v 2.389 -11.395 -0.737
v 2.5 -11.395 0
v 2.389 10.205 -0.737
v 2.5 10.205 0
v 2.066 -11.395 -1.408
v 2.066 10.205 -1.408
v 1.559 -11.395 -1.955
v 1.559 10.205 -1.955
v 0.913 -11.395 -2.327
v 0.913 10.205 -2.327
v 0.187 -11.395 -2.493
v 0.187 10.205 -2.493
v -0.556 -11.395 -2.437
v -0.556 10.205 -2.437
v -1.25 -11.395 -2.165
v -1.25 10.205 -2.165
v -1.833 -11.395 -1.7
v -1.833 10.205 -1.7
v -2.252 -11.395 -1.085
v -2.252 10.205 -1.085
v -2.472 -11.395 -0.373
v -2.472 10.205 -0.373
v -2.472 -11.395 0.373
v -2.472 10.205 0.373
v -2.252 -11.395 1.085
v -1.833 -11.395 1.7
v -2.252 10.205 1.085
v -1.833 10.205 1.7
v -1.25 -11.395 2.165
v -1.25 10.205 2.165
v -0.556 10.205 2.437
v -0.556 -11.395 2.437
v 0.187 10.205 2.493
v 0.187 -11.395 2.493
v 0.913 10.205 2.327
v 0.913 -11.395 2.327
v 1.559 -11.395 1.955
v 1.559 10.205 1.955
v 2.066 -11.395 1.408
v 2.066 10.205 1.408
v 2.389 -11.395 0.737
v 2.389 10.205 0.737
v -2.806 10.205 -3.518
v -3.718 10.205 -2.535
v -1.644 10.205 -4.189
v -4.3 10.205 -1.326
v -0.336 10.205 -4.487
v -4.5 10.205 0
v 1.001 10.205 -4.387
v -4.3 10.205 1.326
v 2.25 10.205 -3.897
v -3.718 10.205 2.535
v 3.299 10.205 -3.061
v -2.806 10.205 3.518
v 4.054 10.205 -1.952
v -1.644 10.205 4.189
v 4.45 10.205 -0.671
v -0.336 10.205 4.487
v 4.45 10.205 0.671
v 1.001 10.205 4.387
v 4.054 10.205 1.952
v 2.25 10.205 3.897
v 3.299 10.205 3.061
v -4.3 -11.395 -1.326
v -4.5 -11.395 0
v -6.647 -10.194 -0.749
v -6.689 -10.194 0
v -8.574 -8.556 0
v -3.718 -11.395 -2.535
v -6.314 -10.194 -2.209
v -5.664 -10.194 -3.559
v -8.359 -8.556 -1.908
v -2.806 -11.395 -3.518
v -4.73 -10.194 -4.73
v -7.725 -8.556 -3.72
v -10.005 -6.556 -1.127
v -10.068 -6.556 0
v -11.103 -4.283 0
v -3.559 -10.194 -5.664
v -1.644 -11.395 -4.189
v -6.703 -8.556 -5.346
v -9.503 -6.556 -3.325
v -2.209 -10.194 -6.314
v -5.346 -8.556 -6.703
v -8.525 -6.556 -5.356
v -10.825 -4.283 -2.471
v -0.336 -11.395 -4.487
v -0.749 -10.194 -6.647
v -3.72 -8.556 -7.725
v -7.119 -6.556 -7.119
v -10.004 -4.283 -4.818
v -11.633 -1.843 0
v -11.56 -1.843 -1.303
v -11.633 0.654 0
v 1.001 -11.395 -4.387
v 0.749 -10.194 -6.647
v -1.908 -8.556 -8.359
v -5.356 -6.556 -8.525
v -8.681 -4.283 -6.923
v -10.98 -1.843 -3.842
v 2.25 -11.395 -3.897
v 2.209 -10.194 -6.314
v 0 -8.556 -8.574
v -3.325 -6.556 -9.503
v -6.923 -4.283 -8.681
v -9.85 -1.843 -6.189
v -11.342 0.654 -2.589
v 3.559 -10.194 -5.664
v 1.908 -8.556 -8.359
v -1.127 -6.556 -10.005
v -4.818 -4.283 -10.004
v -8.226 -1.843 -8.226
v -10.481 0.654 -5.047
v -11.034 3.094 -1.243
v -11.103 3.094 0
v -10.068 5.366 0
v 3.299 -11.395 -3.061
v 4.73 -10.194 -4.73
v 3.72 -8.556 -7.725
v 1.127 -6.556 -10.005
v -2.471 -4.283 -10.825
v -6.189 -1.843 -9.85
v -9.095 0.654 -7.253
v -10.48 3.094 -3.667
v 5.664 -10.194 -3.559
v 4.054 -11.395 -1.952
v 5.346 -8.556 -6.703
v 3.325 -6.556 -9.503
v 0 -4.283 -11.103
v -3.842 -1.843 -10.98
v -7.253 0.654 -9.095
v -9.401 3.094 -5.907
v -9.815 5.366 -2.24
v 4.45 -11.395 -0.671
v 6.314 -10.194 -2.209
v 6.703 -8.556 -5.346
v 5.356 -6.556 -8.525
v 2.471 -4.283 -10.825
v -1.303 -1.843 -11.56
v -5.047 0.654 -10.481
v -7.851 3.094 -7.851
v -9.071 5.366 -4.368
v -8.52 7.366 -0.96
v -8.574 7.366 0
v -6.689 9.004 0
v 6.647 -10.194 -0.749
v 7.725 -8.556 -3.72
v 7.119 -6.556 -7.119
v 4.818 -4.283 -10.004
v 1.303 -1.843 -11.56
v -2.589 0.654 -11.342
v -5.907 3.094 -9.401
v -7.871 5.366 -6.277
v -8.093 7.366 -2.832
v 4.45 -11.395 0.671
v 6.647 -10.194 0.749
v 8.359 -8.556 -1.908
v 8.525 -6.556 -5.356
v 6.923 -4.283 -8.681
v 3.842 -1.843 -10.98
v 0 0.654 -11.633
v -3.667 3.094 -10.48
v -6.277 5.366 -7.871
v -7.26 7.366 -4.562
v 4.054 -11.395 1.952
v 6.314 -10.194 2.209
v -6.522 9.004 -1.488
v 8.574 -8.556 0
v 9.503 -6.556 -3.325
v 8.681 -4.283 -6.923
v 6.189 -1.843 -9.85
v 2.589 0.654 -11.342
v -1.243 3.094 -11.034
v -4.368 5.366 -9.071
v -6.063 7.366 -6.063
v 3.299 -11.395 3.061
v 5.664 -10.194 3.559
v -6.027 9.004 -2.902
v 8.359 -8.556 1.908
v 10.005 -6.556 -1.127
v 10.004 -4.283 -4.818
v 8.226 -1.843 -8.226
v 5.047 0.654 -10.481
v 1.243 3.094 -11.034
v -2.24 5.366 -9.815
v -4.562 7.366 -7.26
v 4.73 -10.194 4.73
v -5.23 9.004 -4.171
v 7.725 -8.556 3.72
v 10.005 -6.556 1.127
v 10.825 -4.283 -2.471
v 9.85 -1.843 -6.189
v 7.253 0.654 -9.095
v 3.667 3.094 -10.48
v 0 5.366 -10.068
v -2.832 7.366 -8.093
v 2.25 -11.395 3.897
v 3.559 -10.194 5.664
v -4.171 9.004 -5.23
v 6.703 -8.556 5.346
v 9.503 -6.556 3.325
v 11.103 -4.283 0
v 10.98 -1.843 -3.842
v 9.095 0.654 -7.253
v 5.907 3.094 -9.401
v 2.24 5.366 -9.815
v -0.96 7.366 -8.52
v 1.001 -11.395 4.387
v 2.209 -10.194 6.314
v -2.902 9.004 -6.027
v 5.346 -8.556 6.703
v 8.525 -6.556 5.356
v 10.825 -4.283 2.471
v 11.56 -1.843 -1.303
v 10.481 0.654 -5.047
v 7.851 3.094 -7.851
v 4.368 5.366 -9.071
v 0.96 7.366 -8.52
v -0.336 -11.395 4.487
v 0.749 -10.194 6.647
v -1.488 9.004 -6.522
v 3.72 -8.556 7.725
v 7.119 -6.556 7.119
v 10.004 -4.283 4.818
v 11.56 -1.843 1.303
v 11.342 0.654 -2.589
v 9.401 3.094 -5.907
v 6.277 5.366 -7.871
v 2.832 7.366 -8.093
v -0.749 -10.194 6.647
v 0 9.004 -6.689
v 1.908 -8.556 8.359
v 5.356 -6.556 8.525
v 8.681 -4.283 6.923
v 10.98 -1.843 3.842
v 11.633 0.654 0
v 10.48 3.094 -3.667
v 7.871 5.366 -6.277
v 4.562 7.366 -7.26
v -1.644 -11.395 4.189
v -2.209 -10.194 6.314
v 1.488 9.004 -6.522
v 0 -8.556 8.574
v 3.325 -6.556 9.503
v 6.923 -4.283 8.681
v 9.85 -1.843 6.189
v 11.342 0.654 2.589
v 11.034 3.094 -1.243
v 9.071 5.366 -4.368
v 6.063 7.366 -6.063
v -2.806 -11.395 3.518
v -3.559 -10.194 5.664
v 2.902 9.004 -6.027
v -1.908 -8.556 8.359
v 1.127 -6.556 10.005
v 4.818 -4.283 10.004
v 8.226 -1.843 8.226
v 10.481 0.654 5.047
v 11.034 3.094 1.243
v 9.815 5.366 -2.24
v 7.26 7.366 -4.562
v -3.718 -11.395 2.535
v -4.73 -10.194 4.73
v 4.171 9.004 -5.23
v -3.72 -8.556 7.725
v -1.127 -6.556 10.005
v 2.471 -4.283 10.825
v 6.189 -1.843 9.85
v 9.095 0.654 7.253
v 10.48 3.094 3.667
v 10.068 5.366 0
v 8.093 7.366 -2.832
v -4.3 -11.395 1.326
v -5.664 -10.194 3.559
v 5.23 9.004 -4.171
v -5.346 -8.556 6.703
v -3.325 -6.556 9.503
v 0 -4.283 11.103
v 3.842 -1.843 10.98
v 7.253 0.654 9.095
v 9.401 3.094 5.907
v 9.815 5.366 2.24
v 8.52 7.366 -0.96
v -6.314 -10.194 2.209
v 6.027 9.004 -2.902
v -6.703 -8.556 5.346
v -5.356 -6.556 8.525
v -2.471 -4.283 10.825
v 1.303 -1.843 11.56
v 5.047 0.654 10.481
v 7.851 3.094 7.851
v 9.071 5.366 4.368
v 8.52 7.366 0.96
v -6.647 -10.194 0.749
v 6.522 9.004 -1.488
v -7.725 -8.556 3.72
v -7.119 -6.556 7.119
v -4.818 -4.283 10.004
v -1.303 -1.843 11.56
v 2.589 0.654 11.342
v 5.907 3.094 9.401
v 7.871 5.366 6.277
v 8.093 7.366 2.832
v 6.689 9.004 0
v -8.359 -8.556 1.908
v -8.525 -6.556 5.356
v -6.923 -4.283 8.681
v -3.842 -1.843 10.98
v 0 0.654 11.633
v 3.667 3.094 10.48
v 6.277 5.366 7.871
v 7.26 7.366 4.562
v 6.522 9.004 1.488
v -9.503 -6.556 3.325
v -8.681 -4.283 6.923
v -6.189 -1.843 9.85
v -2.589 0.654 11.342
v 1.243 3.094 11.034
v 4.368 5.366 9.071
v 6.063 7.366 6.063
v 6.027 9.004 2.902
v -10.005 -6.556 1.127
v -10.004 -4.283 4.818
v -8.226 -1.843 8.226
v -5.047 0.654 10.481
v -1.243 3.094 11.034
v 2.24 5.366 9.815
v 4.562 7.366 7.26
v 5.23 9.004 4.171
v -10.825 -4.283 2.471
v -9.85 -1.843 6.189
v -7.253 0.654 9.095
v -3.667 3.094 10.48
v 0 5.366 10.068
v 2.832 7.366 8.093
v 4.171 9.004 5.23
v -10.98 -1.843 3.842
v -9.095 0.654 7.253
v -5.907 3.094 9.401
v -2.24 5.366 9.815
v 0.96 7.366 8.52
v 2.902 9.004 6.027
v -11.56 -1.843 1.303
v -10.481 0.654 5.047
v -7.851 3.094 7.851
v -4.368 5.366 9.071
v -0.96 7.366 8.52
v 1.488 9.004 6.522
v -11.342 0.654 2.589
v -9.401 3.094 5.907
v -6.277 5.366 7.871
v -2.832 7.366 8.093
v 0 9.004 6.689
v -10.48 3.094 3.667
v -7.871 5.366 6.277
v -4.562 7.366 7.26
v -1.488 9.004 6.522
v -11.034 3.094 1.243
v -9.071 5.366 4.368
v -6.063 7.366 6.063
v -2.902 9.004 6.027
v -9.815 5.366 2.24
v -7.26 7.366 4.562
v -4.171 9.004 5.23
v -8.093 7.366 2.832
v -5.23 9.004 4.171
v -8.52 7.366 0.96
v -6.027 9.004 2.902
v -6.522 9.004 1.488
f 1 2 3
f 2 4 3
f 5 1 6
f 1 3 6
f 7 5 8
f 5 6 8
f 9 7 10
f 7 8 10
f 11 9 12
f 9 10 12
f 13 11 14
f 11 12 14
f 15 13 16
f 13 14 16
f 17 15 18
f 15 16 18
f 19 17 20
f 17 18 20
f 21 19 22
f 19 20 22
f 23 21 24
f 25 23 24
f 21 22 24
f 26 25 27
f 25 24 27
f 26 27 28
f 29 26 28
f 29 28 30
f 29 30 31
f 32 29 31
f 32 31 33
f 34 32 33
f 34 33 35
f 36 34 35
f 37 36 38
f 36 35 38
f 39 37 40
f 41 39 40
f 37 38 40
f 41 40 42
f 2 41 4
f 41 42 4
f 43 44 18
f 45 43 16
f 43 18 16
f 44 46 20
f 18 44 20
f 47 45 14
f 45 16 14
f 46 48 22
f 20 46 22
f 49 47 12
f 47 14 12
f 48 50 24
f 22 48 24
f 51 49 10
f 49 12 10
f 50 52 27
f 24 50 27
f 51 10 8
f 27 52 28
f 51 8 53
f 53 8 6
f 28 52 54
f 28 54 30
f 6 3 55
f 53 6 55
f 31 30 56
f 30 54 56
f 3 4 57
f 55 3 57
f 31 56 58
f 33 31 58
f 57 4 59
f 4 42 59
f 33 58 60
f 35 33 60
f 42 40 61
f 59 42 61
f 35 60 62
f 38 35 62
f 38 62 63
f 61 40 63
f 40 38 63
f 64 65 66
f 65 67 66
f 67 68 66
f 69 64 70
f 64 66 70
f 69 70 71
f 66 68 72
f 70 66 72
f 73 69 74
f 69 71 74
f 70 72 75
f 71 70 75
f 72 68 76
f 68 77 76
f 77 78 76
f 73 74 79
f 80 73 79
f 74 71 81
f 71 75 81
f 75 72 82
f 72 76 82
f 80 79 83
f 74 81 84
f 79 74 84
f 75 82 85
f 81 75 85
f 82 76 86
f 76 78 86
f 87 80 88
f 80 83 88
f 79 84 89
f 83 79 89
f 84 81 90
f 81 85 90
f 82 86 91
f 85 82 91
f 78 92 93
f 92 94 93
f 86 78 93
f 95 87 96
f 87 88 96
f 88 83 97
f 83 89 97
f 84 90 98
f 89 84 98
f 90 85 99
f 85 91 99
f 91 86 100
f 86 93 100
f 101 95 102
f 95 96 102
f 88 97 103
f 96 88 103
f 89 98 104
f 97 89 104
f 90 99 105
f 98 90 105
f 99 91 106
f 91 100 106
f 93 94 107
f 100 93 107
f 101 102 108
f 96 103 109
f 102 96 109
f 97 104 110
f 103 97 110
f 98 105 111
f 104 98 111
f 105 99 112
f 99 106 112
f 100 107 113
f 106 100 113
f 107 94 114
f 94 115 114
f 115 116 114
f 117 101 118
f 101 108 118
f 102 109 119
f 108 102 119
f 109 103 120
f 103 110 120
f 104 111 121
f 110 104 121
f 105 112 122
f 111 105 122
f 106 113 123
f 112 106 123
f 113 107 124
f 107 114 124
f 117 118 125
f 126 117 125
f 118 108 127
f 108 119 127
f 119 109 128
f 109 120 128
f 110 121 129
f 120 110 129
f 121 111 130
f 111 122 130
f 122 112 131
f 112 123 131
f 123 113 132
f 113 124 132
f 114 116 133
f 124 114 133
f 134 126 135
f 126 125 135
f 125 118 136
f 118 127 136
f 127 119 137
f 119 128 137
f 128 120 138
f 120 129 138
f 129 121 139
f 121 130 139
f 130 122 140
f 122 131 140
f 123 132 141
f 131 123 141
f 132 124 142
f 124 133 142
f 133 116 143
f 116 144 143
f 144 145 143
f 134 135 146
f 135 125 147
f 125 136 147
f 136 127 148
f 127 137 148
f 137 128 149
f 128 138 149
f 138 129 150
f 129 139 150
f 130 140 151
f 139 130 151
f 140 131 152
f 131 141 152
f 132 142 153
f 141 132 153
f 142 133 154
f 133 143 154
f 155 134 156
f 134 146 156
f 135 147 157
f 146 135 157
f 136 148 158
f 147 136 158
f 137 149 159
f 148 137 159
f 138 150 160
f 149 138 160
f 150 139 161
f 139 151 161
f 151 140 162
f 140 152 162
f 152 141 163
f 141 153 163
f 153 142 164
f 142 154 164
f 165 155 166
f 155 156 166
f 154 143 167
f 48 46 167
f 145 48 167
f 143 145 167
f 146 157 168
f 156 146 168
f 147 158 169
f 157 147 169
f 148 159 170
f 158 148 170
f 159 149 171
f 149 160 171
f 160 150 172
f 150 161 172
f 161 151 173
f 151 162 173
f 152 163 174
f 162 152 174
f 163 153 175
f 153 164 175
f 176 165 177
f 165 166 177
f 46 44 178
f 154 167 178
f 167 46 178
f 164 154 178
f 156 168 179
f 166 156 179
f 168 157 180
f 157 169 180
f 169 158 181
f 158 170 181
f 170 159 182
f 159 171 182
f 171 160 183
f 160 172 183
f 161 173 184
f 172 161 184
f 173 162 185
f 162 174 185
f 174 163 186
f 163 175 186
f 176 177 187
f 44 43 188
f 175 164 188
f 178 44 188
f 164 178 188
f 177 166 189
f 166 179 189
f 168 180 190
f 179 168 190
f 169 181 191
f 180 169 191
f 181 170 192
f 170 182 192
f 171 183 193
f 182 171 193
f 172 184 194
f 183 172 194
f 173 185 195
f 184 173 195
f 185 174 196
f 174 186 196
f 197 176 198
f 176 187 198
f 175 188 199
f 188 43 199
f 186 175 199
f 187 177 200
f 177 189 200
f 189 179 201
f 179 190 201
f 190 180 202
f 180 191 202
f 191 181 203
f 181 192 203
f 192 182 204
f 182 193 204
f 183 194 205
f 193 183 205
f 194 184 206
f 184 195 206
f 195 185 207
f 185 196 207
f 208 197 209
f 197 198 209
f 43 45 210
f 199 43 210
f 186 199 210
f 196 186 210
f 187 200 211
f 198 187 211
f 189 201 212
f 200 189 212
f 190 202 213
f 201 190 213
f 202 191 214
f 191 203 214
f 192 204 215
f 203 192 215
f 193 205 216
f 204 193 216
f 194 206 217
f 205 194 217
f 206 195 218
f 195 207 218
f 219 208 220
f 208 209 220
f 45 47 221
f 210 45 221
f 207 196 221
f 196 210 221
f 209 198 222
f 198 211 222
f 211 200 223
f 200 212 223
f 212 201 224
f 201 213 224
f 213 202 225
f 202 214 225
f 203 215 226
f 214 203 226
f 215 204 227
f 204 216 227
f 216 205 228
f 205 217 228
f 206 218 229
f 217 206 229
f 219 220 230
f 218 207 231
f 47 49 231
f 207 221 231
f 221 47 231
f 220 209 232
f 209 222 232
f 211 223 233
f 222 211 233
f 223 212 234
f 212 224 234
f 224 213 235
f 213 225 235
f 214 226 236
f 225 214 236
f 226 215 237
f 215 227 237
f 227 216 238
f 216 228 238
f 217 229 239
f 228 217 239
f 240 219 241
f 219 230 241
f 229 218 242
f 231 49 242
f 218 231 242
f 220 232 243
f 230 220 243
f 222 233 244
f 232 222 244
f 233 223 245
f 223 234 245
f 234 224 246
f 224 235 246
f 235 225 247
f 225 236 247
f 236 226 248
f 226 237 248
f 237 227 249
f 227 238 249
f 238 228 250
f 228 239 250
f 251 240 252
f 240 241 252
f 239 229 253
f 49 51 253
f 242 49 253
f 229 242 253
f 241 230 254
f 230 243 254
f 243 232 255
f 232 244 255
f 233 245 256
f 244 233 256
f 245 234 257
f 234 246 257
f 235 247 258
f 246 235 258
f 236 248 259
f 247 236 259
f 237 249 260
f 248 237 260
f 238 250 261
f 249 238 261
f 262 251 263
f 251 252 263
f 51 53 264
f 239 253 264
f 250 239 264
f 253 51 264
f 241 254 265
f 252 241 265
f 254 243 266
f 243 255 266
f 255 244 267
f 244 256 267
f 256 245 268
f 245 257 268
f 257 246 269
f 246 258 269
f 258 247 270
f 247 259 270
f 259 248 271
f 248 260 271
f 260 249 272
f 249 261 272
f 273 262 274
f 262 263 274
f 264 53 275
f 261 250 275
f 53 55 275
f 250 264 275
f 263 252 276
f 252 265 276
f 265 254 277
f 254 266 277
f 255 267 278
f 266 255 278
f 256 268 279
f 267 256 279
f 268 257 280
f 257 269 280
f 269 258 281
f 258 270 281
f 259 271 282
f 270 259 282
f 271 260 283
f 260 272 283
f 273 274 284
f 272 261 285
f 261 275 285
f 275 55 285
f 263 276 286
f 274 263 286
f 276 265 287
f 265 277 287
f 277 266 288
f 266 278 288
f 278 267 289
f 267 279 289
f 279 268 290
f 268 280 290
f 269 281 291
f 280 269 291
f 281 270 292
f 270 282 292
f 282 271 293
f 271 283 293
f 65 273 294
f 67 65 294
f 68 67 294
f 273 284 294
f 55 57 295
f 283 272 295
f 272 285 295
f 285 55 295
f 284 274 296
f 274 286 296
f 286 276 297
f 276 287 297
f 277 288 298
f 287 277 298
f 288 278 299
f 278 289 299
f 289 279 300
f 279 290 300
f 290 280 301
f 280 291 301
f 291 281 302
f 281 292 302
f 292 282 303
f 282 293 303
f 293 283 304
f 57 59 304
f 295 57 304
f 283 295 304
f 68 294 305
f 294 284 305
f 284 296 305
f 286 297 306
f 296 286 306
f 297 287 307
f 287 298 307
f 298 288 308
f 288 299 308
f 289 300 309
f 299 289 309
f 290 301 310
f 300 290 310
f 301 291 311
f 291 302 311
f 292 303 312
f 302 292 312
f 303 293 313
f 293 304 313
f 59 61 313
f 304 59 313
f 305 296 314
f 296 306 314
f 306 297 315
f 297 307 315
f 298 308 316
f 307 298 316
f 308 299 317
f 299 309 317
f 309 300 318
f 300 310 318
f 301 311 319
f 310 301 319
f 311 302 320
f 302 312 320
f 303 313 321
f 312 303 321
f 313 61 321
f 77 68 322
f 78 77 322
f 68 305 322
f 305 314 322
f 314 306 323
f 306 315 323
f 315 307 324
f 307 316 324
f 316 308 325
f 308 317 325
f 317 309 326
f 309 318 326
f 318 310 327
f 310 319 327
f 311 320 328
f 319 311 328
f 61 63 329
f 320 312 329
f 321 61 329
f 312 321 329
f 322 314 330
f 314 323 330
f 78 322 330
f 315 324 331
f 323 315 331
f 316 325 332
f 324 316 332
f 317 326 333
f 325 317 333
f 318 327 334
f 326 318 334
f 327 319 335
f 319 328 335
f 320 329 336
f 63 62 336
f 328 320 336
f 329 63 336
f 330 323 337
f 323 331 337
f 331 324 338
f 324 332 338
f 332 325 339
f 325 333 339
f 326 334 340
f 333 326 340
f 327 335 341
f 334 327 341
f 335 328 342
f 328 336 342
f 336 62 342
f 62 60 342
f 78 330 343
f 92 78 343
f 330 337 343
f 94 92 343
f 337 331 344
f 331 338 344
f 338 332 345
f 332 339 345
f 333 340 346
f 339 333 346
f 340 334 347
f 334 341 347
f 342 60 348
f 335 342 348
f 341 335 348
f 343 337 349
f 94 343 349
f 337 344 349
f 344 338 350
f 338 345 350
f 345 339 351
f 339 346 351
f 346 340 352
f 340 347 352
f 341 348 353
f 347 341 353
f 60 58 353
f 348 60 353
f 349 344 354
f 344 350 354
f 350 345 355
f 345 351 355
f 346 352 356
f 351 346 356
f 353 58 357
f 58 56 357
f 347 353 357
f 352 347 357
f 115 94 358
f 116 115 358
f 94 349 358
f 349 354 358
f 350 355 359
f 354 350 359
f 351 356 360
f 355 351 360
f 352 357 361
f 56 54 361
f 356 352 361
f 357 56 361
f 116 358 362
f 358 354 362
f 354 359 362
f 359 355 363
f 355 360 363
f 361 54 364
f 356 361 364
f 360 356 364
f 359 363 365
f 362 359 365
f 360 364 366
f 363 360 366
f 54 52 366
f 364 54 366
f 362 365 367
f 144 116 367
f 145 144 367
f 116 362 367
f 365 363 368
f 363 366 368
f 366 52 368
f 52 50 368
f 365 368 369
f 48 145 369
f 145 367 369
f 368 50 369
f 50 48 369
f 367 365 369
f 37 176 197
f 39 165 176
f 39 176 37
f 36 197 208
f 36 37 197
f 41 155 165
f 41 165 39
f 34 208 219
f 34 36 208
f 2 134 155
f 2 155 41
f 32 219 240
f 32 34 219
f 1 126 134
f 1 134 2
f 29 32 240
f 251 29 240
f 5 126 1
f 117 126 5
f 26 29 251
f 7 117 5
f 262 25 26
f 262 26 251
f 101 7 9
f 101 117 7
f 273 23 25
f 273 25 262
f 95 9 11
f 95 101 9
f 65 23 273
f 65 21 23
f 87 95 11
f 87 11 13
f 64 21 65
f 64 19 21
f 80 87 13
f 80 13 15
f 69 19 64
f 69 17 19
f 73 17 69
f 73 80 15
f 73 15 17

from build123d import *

# Parameters (mm, degrees)
SKETCH2_R               = 2.5
CUT_EXTRUDE1_DEPTH      = 12.105084746
CUT_EXTRUDE1_DEPTH_BACK = 13.294915254
CUT_EXTRUDE2_DEPTH      = 12.7
CUT_EXTRUDE2_DEPTH_BACK = 12.7


with BuildPart() as part:
    # Sketch1 → Revolve1 (revolve)
    with BuildSketch(Plane.XY):
        with BuildLine():
            Line((0, 11.105084746), (0, -12.294915254))
            ThreePointArc((0, -12.294915254), (-11.7, -0.594915254), (0, 11.105084746))
        make_face()
    revolve(axis=Axis((0, 11.105084746, 0), (0, -1, 0)))

    # Sketch2 → Cut-Extrude1 (cut, two sides)
    with BuildSketch(Plane(origin=(0, 0, 0), x_dir=(1, 0, 0), z_dir=(0, 1, 0))) as cut_extrude1_sk:
        Circle(SKETCH2_R)
    extrude(amount=CUT_EXTRUDE1_DEPTH, mode=Mode.SUBTRACT)
    extrude(cut_extrude1_sk.sketch, amount=-CUT_EXTRUDE1_DEPTH_BACK, mode=Mode.SUBTRACT)

    # Sketch6 → Cut-Extrude2 (cut, two sides)
    with BuildSketch(Plane.XY) as cut_extrude2_sk:
        Polygon((0, 12.205084746), (-13.76858677, 12.205084746), (-13.76858677, 10.205084746), (12.631256699, 10.205084746), (12.631256699, 12.205084746), align=None)
        Polygon((0, -13.394915254), (12.631256699, -13.394915254), (12.631256699, -11.394915254), (-13.76858677, -11.394915254), (-13.76858677, -13.394915254), align=None)
    extrude(amount=CUT_EXTRUDE2_DEPTH, mode=Mode.SUBTRACT)
    extrude(cut_extrude2_sk.sketch, amount=-CUT_EXTRUDE2_DEPTH_BACK, mode=Mode.SUBTRACT)


solid = part.part
